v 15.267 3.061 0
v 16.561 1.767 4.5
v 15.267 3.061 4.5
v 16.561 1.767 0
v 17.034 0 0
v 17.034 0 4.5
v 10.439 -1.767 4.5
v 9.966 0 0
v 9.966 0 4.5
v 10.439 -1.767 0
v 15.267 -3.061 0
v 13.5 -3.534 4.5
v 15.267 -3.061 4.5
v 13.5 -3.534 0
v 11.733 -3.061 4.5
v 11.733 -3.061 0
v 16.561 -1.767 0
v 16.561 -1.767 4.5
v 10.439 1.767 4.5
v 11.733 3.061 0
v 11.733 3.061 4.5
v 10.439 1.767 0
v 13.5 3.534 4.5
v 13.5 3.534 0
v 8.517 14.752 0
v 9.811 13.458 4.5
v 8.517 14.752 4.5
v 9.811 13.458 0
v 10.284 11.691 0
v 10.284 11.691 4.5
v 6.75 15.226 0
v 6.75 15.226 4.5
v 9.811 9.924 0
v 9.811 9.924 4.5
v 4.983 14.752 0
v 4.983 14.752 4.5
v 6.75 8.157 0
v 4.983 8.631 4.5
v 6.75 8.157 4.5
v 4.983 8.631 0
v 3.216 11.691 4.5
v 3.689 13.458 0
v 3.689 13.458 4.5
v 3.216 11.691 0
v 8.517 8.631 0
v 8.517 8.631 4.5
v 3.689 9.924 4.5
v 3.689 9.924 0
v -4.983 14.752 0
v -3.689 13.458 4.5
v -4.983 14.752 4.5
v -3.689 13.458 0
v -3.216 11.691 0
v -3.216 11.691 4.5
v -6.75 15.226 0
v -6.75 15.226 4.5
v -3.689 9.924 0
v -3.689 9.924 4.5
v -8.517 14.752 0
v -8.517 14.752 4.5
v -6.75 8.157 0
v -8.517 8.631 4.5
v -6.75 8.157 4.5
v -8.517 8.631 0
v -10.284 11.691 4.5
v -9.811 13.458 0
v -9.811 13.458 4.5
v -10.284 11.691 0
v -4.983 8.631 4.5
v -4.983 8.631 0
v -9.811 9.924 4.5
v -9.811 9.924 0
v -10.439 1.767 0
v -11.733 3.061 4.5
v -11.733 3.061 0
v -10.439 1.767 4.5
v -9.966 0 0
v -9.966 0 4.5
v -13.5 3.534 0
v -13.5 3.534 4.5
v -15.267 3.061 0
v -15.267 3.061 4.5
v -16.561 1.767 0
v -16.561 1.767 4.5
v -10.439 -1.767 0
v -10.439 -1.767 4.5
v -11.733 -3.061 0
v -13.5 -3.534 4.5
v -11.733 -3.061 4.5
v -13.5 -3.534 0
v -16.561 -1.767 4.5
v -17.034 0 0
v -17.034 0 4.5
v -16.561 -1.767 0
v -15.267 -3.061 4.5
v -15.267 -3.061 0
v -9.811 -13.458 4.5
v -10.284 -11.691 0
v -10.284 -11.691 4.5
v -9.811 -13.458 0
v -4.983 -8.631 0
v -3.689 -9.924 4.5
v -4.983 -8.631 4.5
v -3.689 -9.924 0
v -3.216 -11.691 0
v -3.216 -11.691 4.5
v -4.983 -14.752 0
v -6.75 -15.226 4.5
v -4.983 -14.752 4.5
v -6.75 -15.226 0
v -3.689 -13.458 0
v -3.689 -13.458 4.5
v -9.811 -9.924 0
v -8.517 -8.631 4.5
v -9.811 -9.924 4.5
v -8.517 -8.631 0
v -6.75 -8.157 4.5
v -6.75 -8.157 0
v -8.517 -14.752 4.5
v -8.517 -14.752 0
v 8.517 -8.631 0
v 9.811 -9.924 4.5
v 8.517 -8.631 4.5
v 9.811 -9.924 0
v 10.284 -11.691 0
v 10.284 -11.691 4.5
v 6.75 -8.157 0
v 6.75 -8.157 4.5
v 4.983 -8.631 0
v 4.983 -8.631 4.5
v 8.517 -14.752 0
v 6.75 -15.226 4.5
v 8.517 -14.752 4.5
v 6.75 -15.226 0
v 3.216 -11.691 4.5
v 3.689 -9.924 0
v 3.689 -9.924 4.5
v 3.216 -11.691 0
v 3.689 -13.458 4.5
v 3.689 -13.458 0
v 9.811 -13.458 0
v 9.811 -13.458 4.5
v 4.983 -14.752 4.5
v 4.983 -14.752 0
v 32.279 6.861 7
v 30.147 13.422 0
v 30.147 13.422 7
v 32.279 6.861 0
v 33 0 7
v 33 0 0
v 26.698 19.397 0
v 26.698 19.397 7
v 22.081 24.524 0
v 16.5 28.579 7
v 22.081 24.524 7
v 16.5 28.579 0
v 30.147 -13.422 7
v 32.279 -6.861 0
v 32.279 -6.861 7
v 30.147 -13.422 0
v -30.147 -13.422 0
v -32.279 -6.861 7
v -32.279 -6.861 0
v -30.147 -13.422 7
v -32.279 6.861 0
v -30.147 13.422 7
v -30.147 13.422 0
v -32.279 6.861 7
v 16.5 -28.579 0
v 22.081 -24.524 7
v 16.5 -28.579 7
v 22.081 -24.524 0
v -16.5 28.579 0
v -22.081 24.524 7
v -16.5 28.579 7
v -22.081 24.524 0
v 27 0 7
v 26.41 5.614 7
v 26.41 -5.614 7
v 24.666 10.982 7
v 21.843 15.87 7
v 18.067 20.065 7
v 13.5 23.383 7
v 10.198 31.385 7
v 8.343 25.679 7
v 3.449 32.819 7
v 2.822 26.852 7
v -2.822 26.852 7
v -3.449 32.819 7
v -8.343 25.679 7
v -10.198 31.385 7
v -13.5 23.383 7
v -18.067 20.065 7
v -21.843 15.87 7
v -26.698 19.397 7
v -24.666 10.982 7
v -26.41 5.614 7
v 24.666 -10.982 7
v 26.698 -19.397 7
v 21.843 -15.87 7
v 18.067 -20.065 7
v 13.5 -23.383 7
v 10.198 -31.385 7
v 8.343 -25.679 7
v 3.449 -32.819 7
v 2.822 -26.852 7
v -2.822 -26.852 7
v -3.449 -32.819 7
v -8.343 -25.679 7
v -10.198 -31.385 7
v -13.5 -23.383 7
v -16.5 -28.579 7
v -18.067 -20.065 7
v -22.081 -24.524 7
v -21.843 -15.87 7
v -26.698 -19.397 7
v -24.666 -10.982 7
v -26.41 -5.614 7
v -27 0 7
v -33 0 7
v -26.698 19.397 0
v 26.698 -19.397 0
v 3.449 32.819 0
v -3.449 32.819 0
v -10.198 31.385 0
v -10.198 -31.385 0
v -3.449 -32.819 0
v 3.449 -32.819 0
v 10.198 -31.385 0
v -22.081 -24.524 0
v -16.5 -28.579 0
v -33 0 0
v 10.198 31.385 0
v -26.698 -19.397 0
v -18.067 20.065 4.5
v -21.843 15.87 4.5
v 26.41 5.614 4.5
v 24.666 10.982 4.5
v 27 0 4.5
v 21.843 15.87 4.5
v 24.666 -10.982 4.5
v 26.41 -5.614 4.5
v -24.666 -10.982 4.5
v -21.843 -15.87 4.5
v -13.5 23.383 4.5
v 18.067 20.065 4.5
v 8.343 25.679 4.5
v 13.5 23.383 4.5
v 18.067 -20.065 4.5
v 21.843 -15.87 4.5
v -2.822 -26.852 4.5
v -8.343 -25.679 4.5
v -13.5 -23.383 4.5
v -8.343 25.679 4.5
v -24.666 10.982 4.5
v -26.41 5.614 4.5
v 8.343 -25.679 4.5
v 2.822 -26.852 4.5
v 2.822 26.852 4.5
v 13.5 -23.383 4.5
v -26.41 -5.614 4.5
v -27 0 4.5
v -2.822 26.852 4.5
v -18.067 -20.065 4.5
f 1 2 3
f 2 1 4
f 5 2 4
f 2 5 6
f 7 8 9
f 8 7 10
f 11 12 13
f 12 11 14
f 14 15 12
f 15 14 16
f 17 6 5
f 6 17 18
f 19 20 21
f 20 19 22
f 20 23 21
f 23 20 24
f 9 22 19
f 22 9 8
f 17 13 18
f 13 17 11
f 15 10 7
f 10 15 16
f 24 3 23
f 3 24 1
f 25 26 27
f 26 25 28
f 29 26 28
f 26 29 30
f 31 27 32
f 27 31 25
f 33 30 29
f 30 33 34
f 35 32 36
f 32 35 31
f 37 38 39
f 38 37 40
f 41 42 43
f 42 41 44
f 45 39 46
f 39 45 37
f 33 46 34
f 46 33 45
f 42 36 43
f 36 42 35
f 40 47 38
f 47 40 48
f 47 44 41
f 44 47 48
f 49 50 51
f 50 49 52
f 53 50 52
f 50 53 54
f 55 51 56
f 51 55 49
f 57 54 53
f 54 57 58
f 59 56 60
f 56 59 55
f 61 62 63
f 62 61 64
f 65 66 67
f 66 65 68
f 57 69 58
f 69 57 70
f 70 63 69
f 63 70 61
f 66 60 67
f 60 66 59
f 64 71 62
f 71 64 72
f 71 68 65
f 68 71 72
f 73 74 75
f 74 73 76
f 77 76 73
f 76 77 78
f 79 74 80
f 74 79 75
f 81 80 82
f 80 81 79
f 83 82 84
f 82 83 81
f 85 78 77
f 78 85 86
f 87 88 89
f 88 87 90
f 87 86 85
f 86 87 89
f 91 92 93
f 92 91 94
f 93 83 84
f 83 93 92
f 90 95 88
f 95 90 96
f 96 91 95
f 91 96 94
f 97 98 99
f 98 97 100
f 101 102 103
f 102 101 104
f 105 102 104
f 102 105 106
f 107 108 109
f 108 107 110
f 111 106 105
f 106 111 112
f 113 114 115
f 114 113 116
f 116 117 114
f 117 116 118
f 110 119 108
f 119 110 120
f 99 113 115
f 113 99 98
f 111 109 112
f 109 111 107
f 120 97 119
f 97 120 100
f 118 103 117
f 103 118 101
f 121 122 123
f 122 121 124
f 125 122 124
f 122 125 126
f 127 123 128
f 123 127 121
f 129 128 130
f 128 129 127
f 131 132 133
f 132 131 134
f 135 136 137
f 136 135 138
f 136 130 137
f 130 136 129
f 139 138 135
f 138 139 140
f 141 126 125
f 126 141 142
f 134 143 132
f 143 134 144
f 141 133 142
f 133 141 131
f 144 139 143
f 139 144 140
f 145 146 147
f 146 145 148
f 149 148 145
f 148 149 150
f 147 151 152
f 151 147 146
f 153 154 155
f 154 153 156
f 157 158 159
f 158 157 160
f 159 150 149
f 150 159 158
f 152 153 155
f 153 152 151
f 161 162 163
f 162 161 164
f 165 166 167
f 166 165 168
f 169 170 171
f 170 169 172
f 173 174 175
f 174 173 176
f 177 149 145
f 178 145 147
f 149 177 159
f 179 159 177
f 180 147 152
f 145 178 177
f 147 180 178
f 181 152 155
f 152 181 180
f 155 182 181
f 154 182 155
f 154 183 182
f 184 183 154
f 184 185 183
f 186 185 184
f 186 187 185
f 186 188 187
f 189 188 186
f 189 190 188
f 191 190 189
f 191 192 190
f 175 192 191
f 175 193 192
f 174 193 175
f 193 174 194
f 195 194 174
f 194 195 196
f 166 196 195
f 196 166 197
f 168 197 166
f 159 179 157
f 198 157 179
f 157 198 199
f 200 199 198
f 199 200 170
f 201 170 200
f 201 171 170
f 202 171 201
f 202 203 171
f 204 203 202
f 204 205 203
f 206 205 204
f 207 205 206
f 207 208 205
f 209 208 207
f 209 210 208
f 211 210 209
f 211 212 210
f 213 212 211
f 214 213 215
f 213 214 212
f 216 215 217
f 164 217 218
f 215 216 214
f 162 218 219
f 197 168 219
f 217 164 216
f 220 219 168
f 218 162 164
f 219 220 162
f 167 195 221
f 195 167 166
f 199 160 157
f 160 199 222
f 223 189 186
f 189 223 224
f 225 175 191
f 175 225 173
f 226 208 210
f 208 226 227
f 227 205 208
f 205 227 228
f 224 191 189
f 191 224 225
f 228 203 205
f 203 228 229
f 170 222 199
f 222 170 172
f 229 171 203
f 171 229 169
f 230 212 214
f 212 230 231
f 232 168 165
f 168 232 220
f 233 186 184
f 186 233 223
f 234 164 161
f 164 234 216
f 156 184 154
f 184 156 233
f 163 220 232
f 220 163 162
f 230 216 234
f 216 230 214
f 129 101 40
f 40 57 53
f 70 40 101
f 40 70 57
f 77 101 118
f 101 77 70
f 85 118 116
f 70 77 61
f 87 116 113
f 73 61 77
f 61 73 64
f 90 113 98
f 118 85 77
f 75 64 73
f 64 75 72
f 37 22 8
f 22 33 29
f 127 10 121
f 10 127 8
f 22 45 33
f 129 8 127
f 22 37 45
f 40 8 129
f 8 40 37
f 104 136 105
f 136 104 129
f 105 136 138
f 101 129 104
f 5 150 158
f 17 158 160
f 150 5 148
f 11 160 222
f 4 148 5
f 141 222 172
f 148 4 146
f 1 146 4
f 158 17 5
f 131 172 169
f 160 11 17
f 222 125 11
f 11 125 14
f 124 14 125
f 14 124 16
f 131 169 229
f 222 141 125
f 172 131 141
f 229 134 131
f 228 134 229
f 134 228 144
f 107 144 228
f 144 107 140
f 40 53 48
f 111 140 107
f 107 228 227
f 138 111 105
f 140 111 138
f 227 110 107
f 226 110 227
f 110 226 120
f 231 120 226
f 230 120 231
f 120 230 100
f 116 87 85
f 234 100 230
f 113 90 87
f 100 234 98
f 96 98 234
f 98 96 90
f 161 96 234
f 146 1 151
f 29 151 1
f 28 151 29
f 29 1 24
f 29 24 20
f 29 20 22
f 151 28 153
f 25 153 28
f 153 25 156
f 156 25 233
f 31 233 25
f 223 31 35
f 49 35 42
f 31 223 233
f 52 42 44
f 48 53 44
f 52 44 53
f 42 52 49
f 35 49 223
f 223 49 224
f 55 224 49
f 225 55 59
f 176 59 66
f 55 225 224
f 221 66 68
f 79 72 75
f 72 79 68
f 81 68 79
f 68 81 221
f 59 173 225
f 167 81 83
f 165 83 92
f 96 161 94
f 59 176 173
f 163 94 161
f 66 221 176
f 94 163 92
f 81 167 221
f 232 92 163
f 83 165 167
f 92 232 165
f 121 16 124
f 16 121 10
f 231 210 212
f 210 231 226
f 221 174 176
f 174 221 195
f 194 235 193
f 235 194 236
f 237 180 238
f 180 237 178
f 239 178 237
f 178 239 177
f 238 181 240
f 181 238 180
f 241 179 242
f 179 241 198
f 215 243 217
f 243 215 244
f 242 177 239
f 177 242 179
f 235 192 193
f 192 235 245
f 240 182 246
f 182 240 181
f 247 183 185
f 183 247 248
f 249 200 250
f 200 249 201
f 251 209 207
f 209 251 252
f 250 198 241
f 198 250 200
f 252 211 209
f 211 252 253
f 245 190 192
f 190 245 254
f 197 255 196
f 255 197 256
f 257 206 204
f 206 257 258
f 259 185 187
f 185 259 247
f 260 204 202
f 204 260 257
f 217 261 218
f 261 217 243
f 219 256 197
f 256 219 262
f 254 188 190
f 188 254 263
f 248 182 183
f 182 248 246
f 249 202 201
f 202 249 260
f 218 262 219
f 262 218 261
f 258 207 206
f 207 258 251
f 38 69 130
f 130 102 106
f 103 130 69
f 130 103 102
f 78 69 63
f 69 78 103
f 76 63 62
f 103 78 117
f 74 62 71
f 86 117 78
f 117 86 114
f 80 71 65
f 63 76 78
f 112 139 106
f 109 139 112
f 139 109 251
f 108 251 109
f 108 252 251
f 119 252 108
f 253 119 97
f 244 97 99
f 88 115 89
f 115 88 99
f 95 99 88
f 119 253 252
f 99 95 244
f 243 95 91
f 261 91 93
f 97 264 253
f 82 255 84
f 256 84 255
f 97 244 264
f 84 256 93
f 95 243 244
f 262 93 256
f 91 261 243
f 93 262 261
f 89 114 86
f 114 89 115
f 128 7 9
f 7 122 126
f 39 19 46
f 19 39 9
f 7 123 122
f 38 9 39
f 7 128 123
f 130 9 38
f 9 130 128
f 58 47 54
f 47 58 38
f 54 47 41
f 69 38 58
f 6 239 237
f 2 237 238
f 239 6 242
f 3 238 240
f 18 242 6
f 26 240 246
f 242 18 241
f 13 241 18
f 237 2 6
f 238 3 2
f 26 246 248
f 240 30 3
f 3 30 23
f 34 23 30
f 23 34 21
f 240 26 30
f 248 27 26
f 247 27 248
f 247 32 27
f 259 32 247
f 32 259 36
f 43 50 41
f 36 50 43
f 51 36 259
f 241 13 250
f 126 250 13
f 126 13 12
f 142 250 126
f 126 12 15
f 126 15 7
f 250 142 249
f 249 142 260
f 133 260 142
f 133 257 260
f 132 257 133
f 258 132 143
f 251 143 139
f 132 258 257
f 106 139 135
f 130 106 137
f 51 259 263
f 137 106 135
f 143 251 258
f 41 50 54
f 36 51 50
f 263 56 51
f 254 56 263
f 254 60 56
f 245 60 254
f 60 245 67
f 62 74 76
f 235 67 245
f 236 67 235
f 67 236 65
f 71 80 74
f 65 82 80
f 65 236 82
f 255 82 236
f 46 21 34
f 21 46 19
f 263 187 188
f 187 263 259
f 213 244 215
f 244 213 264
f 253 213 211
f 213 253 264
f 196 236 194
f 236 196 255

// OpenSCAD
// file: constants.scad
/* sinusoid-plotter: A parametric sinusoid plotter made with OpenSCAD.
 * Copyright (C) 2013  Clayton G. Hobbs
 * 
 * This program is free software: you can redistribute it and/or modify
 * it under the terms of the GNU General Public License as published by
 * the Free Software Foundation, either version 3 of the License, or
 * (at your option) any later version.
 * 
 * This program is distributed in the hope that it will be useful,
 * but WITHOUT ANY WARRANTY; without even the implied warranty of
 * MERCHANTABILITY or FITNESS FOR A PARTICULAR PURPOSE.  See the
 * GNU General Public License for more details.
 * 
 * You should have received a copy of the GNU General Public License
 * along with this program.  If not, see <http://www.gnu.org/licenses/>.
 */

pi = 3.1415926535897932384626433832795;
// main file
/* sinusoid-plotter: A parametric sinusoid plotter made with OpenSCAD.
 * Copyright (C) 2013  Clayton G. Hobbs
 * 
 * This program is free software: you can redistribute it and/or modify
 * it under the terms of the GNU General Public License as published by
 * the Free Software Foundation, either version 3 of the License, or
 * (at your option) any later version.
 * 
 * This program is distributed in the hope that it will be useful,
 * but WITHOUT ANY WARRANTY; without even the implied warranty of
 * MERCHANTABILITY or FITNESS FOR A PARTICULAR PURPOSE.  See the
 * GNU General Public License for more details.
 * 
 * You should have received a copy of the GNU General Public License
 * along with this program.  If not, see <http://www.gnu.org/licenses/>.
 */

include <constants.scad>;

module right_wheel(radius, height, rim_thickness, rim_height, holes) {
	half_ir = (radius - rim_thickness)/2;
	hole_radius = pi*half_ir/(holes*2);

	difference() {
		cylinder(r = radius, h = height);

		translate([0, 0, height - rim_height])
		cylinder(r = radius - rim_thickness, h = height);

		for(x = [0:holes-1]) {
			translate([cos(360*x/holes)*half_ir, sin(360*x/holes)*half_ir, -.5])
			cylinder(r = hole_radius, h = height + 1);
		}
	}
}

right_wheel(radius = 33, height = 7, rim_thickness = 6, rim_height = 2.5,
            holes = 6);
